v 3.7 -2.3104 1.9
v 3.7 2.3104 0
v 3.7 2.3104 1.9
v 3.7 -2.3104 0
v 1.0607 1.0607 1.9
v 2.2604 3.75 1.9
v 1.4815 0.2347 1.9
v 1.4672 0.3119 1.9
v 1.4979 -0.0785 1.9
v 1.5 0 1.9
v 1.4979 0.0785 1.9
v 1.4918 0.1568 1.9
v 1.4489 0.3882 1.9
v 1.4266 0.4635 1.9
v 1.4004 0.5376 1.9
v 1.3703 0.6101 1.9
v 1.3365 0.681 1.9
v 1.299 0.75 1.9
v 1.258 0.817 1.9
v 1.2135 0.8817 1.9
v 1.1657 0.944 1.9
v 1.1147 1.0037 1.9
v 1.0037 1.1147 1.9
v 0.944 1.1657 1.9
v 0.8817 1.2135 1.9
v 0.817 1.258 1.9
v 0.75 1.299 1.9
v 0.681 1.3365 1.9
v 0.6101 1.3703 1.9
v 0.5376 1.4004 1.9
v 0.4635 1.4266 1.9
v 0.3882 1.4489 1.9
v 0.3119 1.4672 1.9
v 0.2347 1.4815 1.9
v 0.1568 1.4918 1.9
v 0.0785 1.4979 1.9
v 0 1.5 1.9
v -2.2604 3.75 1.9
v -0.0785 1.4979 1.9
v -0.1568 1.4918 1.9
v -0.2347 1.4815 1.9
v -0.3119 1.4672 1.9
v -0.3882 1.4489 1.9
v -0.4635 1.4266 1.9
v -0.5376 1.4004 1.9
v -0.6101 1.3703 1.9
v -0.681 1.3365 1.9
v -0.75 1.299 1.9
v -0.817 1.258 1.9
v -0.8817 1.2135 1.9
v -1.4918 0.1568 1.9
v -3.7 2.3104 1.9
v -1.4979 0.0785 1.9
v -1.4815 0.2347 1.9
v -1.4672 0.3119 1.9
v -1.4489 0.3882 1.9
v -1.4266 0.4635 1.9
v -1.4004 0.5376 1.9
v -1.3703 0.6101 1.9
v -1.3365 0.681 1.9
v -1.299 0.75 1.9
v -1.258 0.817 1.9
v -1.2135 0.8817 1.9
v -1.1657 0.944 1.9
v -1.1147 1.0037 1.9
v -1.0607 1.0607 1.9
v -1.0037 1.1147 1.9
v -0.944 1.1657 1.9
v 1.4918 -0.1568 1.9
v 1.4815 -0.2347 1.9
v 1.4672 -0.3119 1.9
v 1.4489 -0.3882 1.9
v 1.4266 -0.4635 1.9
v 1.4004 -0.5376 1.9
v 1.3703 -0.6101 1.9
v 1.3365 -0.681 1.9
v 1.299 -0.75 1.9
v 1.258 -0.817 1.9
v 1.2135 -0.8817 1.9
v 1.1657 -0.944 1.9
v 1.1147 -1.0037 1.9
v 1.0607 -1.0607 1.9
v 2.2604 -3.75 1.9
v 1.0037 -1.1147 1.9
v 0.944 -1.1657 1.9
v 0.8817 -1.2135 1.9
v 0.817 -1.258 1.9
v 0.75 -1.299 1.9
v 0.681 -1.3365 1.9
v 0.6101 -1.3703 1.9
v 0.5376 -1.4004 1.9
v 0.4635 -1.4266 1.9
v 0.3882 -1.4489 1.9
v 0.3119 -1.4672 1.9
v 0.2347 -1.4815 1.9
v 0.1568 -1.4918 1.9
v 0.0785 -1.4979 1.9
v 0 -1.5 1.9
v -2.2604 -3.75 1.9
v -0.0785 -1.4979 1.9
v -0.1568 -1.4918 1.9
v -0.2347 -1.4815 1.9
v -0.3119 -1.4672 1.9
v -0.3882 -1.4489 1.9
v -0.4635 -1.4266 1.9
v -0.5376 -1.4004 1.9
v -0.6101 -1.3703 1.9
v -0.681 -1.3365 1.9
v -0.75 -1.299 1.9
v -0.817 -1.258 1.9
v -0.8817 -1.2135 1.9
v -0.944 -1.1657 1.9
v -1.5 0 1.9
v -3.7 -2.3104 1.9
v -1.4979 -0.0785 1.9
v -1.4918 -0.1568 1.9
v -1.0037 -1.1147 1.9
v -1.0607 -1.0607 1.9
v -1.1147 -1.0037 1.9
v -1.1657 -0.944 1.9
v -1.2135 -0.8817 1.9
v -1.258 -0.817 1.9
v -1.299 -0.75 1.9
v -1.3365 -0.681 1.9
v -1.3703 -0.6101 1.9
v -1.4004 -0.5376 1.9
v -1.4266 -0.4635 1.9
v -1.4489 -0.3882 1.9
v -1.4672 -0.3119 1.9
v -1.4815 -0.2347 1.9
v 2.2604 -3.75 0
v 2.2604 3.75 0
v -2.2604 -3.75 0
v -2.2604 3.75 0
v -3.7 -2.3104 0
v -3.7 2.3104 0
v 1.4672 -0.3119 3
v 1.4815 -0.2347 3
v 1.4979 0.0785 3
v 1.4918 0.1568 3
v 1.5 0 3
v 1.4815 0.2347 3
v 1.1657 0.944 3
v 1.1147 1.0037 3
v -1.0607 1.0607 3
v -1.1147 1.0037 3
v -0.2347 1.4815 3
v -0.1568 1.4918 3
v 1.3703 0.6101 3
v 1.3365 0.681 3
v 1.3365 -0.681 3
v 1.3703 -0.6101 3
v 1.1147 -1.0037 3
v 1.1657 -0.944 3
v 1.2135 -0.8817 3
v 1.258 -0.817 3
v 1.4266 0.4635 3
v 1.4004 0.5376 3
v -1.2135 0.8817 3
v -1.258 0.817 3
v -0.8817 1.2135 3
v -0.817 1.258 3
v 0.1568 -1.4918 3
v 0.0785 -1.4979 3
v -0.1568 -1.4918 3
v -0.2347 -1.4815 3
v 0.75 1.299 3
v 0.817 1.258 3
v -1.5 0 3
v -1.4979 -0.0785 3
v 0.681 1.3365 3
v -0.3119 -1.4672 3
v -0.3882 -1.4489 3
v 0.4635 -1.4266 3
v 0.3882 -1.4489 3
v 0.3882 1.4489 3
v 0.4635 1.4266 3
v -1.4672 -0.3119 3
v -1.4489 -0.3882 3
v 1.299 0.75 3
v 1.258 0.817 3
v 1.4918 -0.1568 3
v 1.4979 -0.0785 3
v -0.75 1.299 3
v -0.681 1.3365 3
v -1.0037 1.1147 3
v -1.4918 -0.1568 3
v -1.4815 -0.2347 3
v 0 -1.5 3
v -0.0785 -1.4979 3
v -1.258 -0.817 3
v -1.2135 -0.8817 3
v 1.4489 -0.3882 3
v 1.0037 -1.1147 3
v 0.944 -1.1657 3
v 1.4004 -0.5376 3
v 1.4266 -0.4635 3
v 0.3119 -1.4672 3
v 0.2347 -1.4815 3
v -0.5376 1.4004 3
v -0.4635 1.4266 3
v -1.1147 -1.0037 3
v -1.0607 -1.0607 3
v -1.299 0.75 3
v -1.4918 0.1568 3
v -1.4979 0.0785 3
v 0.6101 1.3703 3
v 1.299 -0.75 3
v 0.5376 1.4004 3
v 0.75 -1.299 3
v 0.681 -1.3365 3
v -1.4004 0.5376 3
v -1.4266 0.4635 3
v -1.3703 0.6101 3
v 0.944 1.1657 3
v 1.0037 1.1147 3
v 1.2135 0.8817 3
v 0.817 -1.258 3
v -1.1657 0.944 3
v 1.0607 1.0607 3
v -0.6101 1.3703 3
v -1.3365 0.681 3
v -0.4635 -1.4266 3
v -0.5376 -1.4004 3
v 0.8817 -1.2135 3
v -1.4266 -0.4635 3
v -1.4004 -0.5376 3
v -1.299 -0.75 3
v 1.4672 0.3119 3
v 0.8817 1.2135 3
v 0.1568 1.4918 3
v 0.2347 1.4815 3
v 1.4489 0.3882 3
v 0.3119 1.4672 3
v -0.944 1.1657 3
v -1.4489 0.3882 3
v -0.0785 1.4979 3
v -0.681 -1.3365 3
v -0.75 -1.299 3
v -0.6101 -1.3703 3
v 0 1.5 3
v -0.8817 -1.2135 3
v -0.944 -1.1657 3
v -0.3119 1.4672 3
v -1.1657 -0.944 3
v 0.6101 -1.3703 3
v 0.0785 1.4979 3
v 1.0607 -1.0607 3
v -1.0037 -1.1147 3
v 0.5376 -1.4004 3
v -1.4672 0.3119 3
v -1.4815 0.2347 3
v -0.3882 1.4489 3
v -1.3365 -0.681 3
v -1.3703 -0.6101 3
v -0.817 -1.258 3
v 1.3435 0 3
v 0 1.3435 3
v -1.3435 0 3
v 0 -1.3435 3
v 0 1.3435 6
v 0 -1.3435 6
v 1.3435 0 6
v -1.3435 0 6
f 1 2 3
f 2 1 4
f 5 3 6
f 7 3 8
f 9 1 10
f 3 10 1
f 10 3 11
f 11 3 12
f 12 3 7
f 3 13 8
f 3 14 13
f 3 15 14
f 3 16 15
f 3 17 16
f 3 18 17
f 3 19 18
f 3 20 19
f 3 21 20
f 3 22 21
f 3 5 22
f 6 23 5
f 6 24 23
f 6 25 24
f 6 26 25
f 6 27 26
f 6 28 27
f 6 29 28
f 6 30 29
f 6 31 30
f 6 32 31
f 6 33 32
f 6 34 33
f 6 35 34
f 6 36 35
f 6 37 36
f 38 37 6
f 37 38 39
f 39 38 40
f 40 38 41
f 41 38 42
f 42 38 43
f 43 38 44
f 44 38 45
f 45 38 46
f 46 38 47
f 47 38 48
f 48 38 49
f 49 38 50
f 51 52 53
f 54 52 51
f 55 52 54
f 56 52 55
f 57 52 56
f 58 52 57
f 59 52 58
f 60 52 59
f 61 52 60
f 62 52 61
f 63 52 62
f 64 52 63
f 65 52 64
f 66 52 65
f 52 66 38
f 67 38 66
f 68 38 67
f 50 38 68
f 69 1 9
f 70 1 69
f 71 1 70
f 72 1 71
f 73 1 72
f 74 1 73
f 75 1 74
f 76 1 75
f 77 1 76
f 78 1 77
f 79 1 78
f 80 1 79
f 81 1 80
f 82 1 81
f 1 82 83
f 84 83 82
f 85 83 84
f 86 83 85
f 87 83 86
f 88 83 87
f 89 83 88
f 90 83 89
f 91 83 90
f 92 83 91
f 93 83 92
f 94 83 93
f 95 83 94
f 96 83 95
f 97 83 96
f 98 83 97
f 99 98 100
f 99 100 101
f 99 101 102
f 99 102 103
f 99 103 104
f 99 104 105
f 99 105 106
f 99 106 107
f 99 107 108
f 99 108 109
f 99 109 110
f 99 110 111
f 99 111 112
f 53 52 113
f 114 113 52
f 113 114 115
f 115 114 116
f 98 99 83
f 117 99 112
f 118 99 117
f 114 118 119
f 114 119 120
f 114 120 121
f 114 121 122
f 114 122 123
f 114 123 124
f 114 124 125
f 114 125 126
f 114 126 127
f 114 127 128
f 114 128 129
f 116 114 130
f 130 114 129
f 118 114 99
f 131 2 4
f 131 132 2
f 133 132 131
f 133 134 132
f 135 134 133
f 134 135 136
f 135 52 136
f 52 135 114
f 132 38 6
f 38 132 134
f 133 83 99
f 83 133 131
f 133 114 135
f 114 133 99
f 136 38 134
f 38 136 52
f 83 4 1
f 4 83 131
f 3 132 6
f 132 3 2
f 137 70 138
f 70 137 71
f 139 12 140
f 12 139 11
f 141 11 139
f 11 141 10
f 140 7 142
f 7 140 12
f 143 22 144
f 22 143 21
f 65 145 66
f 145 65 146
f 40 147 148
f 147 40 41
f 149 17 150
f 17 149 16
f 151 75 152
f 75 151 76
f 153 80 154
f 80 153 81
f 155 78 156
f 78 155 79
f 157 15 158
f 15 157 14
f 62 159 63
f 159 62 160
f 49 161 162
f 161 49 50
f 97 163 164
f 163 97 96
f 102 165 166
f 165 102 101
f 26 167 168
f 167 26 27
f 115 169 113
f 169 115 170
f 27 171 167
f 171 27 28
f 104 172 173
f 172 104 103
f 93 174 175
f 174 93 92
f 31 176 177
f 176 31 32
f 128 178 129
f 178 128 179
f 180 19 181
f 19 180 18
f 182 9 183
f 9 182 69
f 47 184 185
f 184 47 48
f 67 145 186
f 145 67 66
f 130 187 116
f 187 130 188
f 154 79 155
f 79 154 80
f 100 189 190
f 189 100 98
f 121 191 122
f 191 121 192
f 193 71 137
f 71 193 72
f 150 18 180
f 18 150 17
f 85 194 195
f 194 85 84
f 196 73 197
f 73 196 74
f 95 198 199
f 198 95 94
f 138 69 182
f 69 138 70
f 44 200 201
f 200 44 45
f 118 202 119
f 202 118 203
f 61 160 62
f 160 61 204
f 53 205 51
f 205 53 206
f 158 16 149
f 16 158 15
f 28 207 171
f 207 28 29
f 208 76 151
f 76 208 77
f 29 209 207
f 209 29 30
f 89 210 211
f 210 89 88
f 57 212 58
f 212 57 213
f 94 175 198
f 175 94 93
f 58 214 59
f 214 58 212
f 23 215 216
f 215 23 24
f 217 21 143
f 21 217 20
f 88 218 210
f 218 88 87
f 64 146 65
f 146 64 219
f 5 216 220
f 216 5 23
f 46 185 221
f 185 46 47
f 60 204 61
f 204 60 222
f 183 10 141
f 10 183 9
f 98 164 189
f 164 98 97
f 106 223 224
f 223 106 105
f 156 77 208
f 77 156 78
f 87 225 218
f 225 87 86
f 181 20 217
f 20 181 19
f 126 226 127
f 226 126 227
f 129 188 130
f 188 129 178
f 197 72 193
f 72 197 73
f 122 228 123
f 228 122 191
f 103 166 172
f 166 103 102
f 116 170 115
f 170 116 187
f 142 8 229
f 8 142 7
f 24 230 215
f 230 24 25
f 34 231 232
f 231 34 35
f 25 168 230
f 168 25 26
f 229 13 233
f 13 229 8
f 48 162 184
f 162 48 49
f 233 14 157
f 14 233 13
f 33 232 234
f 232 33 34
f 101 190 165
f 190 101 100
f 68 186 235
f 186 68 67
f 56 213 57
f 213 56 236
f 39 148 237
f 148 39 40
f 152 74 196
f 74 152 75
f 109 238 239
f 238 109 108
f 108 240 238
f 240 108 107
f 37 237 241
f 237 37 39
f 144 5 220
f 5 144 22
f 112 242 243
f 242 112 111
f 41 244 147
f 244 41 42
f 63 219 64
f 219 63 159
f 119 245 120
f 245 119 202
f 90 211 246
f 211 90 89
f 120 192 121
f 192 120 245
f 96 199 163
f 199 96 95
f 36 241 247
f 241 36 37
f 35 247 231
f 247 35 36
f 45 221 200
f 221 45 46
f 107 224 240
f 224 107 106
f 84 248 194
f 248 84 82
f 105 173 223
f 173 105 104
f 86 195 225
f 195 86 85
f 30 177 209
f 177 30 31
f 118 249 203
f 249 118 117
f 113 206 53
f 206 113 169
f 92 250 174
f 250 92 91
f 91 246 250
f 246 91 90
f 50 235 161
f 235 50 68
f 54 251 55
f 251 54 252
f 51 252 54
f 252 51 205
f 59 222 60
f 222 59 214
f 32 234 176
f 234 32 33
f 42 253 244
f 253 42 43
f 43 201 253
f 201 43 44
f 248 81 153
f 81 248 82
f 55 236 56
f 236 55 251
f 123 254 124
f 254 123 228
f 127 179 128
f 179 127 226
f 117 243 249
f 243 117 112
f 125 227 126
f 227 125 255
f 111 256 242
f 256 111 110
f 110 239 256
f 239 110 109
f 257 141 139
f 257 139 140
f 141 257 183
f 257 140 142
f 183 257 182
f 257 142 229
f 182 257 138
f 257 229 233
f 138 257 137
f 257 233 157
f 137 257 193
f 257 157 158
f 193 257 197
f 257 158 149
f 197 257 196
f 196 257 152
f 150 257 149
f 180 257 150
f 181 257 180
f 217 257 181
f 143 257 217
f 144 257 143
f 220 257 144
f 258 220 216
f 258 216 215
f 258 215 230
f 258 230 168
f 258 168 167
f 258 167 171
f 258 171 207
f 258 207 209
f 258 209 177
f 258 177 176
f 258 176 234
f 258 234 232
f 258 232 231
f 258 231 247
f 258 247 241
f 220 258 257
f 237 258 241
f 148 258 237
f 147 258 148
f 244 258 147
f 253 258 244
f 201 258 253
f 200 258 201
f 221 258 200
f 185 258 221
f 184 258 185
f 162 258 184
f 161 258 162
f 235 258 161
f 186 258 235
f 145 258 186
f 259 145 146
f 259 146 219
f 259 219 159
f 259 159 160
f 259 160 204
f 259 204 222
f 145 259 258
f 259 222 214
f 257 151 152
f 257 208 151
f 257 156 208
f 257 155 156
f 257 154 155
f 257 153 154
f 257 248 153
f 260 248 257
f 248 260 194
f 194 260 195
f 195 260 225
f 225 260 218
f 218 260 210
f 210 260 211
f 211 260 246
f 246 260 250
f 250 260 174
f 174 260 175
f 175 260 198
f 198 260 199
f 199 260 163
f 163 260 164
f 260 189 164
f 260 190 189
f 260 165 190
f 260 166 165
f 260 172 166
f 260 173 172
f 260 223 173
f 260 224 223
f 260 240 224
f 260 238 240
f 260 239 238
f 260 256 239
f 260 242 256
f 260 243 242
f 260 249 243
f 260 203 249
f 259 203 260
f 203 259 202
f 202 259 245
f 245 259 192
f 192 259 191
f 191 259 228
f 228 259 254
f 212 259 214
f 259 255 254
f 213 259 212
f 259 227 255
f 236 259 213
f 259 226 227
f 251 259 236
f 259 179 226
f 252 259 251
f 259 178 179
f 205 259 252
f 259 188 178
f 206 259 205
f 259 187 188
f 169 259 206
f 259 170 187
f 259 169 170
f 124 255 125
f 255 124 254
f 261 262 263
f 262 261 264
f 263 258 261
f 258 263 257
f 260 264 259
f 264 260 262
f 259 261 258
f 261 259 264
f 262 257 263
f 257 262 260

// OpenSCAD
intersection()
{
    translate([0,0,0.95])cube([7.4,7.5,1.9],center=true);
    translate([0,0,0.99])rotate([0,0,45])cube([8.5,8.5,2],center=true);
}
cylinder(h=3,d=3,$fn=120);
rotate([0,0,45])translate([0,0,3])cube([1.9,1.9,6],center=true);
